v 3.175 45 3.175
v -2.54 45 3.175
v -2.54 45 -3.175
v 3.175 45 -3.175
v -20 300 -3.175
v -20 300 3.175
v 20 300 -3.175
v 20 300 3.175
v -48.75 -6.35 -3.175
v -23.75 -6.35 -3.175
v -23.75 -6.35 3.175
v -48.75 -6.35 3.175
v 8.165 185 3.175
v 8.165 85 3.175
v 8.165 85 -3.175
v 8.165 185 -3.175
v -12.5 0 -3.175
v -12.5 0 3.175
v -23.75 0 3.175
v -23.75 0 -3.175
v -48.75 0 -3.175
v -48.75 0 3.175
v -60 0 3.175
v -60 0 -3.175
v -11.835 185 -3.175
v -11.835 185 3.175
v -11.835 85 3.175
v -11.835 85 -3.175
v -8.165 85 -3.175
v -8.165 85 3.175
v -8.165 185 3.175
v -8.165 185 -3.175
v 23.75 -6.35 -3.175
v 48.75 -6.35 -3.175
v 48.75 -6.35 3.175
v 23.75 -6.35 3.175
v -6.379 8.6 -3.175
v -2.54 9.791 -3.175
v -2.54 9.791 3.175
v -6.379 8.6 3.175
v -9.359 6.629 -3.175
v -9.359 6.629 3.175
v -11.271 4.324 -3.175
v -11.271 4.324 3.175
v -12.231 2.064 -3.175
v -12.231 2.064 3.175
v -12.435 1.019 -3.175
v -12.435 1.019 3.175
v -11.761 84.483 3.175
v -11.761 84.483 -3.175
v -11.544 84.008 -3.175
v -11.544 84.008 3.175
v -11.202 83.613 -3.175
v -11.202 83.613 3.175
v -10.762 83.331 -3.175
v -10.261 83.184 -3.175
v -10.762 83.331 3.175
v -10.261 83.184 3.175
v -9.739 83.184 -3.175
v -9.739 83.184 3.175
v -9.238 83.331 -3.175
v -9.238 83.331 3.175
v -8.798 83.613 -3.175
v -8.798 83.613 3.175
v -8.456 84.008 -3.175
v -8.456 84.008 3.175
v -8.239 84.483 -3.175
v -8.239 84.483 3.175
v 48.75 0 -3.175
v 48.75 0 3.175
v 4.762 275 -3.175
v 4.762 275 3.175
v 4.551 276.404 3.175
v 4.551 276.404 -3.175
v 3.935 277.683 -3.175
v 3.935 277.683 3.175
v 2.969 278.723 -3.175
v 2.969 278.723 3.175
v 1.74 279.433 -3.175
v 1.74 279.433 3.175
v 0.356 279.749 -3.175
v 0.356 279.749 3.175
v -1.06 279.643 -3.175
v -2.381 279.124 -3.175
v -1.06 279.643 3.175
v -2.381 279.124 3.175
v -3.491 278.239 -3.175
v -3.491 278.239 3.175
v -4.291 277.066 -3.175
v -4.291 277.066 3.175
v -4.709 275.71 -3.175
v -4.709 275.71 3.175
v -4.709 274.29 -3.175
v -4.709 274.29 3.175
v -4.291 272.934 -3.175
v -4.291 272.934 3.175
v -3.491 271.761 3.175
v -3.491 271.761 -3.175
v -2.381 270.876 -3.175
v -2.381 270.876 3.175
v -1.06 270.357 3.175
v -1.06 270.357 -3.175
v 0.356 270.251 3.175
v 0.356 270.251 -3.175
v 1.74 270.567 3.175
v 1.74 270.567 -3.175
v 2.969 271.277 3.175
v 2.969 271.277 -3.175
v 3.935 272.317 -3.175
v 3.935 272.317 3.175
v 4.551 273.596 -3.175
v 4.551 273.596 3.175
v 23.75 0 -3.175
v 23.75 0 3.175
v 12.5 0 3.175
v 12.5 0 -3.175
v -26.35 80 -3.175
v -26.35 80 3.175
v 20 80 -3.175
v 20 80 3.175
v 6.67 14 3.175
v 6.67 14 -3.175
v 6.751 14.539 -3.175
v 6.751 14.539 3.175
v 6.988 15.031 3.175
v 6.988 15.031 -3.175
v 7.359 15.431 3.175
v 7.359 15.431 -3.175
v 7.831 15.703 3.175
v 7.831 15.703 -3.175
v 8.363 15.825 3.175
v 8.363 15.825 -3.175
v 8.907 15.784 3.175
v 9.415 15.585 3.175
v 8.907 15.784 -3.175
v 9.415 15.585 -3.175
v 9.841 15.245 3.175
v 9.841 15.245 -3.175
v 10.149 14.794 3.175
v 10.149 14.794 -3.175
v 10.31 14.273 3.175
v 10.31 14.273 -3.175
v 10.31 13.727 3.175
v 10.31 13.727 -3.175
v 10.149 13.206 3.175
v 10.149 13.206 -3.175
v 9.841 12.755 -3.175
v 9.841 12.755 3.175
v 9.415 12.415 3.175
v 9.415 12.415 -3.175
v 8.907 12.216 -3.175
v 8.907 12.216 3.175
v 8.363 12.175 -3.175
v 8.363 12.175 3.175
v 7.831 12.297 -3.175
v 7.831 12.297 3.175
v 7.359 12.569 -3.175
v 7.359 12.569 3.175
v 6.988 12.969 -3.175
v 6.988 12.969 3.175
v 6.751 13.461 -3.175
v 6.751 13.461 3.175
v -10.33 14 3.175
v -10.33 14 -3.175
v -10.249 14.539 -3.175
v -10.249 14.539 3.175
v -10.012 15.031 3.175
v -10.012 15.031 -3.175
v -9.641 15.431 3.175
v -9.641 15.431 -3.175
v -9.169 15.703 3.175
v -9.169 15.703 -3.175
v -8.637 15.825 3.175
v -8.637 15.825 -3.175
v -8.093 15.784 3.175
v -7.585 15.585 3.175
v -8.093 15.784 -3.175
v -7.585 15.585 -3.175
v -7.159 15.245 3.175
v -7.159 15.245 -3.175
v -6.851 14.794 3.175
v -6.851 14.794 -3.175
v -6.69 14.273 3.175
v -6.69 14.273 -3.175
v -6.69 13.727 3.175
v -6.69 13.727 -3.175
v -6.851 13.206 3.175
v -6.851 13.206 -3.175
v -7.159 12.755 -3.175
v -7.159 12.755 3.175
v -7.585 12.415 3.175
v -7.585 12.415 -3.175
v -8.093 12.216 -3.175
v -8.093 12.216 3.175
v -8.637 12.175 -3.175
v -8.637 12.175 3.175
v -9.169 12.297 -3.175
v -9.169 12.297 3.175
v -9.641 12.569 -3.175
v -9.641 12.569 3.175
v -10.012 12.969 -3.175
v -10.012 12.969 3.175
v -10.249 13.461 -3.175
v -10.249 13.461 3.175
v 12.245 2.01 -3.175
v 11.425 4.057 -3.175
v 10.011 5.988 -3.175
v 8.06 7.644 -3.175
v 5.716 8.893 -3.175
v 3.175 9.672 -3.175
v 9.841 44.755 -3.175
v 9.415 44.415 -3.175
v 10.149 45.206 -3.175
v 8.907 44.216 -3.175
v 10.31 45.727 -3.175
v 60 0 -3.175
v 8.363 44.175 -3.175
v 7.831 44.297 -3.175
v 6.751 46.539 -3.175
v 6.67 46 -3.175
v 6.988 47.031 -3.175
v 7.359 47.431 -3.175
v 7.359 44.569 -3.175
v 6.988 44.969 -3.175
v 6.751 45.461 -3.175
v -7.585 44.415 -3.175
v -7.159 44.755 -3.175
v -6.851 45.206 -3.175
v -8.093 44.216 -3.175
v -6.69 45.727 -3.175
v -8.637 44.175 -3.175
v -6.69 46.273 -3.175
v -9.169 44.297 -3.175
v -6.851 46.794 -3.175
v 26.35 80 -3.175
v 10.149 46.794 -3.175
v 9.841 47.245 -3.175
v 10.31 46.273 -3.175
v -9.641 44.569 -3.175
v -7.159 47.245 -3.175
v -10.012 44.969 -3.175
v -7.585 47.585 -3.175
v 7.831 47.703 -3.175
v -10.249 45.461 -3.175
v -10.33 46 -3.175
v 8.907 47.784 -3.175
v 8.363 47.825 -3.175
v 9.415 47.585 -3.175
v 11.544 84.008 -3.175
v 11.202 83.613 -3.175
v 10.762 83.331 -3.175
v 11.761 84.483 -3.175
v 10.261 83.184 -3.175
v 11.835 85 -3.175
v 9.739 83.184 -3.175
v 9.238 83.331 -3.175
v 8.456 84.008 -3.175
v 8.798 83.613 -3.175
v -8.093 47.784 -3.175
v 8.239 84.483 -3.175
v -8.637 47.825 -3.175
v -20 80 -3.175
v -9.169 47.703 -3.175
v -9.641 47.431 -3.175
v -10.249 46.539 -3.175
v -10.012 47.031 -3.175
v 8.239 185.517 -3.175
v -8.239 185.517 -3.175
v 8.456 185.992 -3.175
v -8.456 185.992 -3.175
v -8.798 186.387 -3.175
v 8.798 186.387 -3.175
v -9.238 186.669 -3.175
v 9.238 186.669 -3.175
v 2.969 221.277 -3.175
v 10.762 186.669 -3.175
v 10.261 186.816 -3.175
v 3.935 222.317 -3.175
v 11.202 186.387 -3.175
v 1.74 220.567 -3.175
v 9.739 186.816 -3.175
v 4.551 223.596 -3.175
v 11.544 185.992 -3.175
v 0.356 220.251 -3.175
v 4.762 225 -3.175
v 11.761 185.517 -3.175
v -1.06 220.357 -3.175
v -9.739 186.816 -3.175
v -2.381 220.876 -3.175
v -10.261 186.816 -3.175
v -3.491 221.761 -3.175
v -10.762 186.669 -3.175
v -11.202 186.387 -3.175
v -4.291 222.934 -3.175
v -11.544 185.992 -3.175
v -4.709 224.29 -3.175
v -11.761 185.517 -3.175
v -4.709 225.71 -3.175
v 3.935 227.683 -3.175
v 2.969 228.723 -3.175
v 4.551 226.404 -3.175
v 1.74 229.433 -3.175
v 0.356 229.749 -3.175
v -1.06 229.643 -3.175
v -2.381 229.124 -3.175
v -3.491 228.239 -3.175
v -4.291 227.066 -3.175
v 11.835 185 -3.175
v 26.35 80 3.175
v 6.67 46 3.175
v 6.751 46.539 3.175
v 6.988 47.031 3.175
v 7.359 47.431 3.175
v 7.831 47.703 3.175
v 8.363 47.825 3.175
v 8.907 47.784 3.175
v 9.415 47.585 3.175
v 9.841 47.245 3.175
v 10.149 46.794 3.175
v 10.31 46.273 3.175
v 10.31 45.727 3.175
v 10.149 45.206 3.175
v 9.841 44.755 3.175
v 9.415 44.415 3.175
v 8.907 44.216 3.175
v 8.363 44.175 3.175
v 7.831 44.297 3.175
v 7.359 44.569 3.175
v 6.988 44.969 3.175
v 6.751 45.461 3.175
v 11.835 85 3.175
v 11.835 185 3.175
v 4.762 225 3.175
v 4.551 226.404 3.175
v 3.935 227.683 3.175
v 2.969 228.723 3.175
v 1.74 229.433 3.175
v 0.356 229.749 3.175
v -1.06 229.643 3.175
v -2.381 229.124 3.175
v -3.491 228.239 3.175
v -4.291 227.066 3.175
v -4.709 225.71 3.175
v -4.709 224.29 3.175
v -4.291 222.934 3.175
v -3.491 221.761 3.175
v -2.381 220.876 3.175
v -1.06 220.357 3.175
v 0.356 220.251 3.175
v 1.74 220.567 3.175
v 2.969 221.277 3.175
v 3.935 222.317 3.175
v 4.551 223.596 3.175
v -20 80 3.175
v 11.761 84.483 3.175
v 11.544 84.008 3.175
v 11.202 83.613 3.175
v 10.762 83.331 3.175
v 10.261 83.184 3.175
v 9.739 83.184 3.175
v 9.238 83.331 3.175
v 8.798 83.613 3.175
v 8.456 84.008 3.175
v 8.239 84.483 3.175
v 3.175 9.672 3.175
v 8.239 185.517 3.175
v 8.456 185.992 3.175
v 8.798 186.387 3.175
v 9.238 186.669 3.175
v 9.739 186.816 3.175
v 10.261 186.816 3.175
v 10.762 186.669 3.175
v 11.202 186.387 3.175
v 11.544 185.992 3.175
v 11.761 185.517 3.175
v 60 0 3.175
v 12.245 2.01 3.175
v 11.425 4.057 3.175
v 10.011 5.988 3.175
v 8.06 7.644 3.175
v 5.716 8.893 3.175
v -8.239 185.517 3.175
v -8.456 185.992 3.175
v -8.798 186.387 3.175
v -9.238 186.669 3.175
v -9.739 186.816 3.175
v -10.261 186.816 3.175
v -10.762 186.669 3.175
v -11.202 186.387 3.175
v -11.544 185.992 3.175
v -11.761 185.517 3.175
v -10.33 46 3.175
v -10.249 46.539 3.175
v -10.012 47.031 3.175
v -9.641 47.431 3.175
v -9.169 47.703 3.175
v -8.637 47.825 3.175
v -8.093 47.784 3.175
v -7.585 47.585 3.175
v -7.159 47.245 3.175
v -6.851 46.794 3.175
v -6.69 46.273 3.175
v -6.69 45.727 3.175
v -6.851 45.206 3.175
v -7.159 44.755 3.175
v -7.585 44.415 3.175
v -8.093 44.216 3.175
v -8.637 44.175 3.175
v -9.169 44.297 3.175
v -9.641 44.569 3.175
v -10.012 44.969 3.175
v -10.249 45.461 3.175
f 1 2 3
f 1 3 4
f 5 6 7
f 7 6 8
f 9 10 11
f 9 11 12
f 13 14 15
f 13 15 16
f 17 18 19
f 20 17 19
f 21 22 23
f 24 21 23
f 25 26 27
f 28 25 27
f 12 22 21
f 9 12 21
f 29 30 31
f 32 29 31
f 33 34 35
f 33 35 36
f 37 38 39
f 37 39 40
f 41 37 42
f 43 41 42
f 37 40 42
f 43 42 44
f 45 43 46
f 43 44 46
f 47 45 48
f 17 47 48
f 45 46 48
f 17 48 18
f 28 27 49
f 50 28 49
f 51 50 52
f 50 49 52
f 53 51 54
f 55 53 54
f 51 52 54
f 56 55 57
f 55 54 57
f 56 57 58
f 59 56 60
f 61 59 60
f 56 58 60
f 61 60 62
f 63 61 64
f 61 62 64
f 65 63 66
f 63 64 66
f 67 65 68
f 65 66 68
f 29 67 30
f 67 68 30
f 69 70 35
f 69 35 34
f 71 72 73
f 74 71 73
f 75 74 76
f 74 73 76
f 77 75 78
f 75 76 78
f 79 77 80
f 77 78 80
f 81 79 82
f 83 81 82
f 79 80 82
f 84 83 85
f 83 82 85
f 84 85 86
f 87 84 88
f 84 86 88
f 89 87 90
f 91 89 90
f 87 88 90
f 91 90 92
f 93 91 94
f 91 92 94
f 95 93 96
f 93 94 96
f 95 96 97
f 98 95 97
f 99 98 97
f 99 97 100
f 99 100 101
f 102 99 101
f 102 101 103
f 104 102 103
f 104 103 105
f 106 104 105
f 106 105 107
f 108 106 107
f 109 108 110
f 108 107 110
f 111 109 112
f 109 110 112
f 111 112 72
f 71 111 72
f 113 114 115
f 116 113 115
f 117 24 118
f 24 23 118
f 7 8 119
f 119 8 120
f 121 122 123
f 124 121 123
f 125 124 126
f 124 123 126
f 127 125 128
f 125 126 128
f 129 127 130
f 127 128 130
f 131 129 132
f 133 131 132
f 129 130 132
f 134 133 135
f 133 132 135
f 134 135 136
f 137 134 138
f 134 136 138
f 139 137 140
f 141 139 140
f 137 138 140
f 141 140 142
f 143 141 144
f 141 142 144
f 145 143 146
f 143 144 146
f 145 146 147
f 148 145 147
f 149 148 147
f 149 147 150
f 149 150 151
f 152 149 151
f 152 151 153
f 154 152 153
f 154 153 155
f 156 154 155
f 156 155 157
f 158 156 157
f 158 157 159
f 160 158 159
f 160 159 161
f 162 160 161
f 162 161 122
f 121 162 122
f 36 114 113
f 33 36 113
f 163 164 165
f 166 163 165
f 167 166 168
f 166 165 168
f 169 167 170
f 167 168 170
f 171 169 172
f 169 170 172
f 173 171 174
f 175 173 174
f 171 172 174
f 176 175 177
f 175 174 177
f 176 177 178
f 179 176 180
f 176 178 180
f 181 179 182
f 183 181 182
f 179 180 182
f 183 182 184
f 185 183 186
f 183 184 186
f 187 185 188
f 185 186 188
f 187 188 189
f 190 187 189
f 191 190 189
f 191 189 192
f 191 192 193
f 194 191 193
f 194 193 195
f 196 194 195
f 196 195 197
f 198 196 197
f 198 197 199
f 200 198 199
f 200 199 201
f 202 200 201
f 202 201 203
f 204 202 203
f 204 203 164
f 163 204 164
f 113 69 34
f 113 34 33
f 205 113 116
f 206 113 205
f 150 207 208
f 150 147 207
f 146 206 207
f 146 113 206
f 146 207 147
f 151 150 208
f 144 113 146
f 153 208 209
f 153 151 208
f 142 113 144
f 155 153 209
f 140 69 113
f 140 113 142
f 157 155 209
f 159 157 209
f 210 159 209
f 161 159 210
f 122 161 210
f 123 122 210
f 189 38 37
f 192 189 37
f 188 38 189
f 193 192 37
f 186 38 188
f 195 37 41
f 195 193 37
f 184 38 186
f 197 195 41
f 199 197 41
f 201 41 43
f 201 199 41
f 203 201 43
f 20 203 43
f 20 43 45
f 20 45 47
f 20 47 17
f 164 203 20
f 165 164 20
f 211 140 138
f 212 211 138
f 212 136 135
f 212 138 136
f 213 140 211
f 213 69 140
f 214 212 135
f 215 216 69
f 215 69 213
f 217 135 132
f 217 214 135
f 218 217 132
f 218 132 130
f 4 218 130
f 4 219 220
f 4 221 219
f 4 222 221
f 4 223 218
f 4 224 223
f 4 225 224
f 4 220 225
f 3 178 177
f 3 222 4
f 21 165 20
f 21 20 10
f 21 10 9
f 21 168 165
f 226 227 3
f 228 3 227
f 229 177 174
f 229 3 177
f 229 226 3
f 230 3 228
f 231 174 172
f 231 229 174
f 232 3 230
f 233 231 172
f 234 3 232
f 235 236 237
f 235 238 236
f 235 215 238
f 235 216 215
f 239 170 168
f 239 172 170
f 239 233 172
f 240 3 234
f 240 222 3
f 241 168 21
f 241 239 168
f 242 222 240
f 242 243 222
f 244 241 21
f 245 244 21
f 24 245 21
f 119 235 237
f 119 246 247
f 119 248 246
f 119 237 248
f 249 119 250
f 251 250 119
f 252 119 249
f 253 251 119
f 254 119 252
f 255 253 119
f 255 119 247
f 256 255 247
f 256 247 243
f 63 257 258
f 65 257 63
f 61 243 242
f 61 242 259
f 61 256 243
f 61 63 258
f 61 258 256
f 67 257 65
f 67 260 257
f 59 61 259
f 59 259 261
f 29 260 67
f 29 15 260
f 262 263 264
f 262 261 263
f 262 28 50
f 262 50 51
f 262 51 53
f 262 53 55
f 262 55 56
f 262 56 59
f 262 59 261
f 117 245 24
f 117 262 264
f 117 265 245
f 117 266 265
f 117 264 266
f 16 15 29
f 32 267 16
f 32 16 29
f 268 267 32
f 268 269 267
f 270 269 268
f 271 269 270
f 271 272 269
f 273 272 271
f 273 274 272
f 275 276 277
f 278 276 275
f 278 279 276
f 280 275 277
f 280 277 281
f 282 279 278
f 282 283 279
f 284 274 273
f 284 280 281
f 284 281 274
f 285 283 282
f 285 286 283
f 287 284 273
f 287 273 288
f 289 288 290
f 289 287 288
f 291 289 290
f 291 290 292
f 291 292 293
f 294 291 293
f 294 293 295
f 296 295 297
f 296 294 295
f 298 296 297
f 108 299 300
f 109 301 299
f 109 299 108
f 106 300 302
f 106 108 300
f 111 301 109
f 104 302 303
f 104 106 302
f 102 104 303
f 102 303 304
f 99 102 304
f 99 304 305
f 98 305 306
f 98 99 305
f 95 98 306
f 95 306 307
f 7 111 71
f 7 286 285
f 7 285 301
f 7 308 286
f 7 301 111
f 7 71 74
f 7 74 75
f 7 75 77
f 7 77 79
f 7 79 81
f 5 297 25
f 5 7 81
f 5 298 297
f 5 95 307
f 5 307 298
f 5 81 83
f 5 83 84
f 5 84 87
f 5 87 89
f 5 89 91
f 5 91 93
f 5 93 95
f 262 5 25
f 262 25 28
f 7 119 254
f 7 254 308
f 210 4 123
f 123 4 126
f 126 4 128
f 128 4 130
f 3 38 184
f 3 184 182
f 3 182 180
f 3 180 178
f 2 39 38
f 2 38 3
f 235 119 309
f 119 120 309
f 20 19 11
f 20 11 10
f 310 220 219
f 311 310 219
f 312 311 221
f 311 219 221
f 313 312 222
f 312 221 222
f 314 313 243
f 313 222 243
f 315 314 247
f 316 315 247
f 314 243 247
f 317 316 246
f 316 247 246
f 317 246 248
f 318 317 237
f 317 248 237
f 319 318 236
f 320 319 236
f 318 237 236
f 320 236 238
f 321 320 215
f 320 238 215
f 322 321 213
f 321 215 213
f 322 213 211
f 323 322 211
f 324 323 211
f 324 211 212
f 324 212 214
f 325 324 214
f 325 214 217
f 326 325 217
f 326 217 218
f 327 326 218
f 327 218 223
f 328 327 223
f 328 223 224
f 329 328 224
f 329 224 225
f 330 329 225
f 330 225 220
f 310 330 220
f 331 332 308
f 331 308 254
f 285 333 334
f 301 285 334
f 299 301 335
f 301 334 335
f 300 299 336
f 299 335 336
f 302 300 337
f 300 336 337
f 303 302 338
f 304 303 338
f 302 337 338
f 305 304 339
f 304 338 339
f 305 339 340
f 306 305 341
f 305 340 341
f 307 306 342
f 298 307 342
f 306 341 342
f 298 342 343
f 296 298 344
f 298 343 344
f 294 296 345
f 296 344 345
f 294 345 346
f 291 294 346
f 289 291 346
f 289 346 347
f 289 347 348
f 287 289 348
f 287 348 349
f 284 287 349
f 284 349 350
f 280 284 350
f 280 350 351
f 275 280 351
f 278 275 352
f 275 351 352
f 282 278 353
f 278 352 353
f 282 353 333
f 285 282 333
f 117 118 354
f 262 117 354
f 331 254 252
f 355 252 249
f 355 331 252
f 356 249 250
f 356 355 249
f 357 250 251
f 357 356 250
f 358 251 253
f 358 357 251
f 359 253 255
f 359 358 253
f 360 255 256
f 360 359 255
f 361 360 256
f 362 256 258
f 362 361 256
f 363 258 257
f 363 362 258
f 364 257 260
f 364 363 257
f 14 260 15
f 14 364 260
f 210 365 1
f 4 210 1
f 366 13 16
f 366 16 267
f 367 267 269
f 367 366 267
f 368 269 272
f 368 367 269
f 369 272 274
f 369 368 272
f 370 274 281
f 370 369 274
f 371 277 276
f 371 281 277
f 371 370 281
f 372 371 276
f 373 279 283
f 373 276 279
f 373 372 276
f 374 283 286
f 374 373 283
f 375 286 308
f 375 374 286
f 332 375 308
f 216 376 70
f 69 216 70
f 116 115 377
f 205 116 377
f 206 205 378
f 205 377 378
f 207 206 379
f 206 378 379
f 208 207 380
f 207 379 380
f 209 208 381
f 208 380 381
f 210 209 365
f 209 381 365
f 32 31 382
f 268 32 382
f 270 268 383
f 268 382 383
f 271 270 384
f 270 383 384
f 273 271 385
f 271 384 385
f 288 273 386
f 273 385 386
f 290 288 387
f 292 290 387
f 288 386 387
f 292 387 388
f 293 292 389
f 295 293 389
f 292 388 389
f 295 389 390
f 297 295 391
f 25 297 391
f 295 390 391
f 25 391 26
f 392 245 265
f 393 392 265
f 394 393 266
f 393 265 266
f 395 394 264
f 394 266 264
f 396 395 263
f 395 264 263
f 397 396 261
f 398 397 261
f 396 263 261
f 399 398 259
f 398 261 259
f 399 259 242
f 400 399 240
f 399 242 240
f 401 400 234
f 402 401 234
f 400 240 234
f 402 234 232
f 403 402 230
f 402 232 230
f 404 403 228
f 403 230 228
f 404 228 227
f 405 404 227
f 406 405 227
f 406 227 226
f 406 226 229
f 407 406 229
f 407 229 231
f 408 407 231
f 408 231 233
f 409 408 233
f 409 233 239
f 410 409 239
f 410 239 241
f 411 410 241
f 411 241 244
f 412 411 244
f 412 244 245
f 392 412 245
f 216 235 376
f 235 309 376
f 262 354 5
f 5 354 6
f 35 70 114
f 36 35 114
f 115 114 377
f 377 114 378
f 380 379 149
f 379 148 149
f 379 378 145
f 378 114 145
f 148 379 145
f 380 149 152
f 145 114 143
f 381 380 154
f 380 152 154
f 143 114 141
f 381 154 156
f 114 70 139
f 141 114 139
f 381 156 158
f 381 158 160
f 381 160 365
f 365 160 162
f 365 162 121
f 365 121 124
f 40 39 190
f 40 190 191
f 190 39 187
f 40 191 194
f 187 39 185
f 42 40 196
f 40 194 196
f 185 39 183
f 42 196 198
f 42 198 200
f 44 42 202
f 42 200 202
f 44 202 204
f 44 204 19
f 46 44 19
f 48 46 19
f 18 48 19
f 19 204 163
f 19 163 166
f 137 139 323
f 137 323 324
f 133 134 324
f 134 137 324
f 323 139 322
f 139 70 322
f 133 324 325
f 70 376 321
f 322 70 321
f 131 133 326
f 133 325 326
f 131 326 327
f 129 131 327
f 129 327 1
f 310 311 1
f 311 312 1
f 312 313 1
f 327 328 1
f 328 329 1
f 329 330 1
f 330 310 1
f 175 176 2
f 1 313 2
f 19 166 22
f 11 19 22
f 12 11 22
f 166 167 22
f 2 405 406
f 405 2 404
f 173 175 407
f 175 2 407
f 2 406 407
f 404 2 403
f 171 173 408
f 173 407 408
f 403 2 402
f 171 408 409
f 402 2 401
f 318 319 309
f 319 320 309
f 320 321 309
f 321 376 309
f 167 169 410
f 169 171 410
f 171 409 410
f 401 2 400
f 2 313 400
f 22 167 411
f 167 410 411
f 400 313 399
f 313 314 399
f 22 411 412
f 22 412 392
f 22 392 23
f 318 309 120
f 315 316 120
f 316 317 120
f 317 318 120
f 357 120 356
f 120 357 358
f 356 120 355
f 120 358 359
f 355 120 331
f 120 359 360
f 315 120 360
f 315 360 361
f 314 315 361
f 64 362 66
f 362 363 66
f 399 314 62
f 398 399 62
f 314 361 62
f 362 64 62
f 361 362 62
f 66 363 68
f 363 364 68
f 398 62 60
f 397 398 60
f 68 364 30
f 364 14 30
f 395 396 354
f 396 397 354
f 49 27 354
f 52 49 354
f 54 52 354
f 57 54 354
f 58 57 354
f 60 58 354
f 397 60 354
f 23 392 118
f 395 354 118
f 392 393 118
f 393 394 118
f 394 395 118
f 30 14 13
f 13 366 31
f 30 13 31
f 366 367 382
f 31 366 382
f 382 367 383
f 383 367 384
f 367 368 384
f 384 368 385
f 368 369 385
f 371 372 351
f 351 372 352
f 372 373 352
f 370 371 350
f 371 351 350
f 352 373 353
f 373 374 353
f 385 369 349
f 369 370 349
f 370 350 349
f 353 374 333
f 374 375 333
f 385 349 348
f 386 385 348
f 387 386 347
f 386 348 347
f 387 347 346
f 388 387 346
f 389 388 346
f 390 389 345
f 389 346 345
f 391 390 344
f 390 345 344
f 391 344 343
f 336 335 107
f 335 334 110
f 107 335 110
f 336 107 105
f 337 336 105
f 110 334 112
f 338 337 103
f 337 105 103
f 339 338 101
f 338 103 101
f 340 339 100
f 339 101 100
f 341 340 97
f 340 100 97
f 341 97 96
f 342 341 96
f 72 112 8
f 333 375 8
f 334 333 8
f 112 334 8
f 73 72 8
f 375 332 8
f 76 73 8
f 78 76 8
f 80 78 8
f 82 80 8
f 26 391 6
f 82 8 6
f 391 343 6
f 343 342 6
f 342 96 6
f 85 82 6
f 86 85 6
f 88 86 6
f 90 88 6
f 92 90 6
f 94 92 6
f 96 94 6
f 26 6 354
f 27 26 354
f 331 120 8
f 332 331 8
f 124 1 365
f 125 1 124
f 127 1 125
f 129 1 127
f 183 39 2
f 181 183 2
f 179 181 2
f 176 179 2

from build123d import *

# Parameters (mm, degrees)
BOSS_EXTRU_1_DEPTH      = 3.175
SKETCH1_R               = 4.7625
CUT_EXTRUDE1_DEPTH      = 6.35
ENL_V_MAT_EXTRU_1_DEPTH = 6.35
ESQUISSE3_W             = 5.715
ESQUISSE3_H             = 45
ENL_V_MAT_EXTRU_2_DEPTH = 6.35
ENL_V_MAT_EXTRU_3_REACH = 308.007
ESQUISSE5_R             = 1.83
ENL_V_MAT_EXTRU_4_REACH = 308.007
SKETCH3_W               = 25
SKETCH3_H               = 6.35
BOSS_EXTRUDE2_DEPTH     = 6.35


with BuildPart() as part:
    # Esquisse1 → Boss.-Extru.1 (new, symmetric)
    with BuildSketch(Plane.XY):
        Polygon((-20, 300), (20, 300), (20, 80), (26.35, 80), (60, 0), (-60, 0), (-26.35, 80), (-20, 80), align=None)
    extrude(amount=BOSS_EXTRU_1_DEPTH, both=True)

    # Sketch1 → Cut-Extrude1 (cut)
    with BuildSketch(Plane.XY.offset(3.175)):
        with Locations((0, 275)):
            Circle(SKETCH1_R)
        with Locations((0, 225)):
            Circle(SKETCH1_R)
    extrude(amount=-CUT_EXTRUDE1_DEPTH, mode=Mode.SUBTRACT)

    # Esquisse2 → Enlèv. mat.-Extru.1 (cut)
    with BuildSketch(Plane.XY.offset(3.175)):
        with BuildLine():
            Line((-12.5, 0), (12.5, 0))
            add(Edge.make_bspline(
                [(12.5, 0), (12.5, 10), (0, 10), (-12.5, 10), (-12.5, 0)],
                knots=[0, 0, 0, 1.570796327, 1.570796327, 3.141592654, 3.141592654, 3.141592654], degree=2, weights=[1, 0.707106781, 1, 0.707106781, 1]))
        make_face()
    extrude(amount=-ENL_V_MAT_EXTRU_1_DEPTH, mode=Mode.SUBTRACT)

    # Esquisse3 → Enlèv. mat.-Extru.2 (cut)
    with BuildSketch(Plane.XY.offset(3.175)):
        with Locations((0.3175, 22.5)):
            Rectangle(ESQUISSE3_W, ESQUISSE3_H)
    extrude(amount=-ENL_V_MAT_EXTRU_2_DEPTH, mode=Mode.SUBTRACT)

    # Esquisse5 → Enlèv. mat.-Extru.3 (cut, up to next)
    with BuildSketch(Plane(origin=(0, 0, -3.175), x_dir=(-1, 0, 0), z_dir=(0, 0, -1)), mode=Mode.PRIVATE) as enl_v_mat_extru_3_sk1:
        with Locations((-8.5, 46)):
            Circle(ESQUISSE5_R)
    enl_v_mat_extru_3_tool1 = extrude(enl_v_mat_extru_3_sk1.sketch, amount=-ENL_V_MAT_EXTRU_3_REACH, mode=Mode.PRIVATE) & part.part
    # Esquisse5 → Enlèv. mat.-Extru.3 (cut, up to next)
    with BuildSketch(Plane(origin=(0, 0, -3.175), x_dir=(-1, 0, 0), z_dir=(0, 0, -1)), mode=Mode.PRIVATE) as enl_v_mat_extru_3_sk2:
        with Locations((8.5, 46)):
            Circle(ESQUISSE5_R)
    enl_v_mat_extru_3_tool2 = extrude(enl_v_mat_extru_3_sk2.sketch, amount=-ENL_V_MAT_EXTRU_3_REACH, mode=Mode.PRIVATE) & part.part
    # Esquisse5 → Enlèv. mat.-Extru.3 (cut, up to next)
    with BuildSketch(Plane(origin=(0, 0, -3.175), x_dir=(-1, 0, 0), z_dir=(0, 0, -1)), mode=Mode.PRIVATE) as enl_v_mat_extru_3_sk3:
        with Locations((8.5, 14)):
            Circle(ESQUISSE5_R)
    enl_v_mat_extru_3_tool3 = extrude(enl_v_mat_extru_3_sk3.sketch, amount=-ENL_V_MAT_EXTRU_3_REACH, mode=Mode.PRIVATE) & part.part
    # Esquisse5 → Enlèv. mat.-Extru.3 (cut, up to next)
    with BuildSketch(Plane(origin=(0, 0, -3.175), x_dir=(-1, 0, 0), z_dir=(0, 0, -1)), mode=Mode.PRIVATE) as enl_v_mat_extru_3_sk4:
        with Locations((-8.5, 14)):
            Circle(ESQUISSE5_R)
    enl_v_mat_extru_3_tool4 = extrude(enl_v_mat_extru_3_sk4.sketch, amount=-ENL_V_MAT_EXTRU_3_REACH, mode=Mode.PRIVATE) & part.part
    add(enl_v_mat_extru_3_tool1.solids().sort_by_distance((8.5, 46, -3.175))[0], mode=Mode.SUBTRACT)
    add(enl_v_mat_extru_3_tool2.solids().sort_by_distance((-8.5, 46, -3.175))[0], mode=Mode.SUBTRACT)
    add(enl_v_mat_extru_3_tool3.solids().sort_by_distance((-8.5, 14, -3.175))[0], mode=Mode.SUBTRACT)
    add(enl_v_mat_extru_3_tool4.solids().sort_by_distance((8.5, 14, -3.175))[0], mode=Mode.SUBTRACT)

    # Esquisse6 → Enlèv. mat.-Extru.4 (cut, up to next)
    with BuildSketch(Plane.XY.offset(3.175), mode=Mode.PRIVATE) as enl_v_mat_extru_4_sk1:
        with BuildLine():
            Line((-11.835, 185), (-11.835, 85))
            ThreePointArc((-11.835, 85), (-10, 83.165), (-8.165, 85))
            Line((-8.165, 85), (-8.165, 185))
            ThreePointArc((-8.165, 185), (-10, 186.835), (-11.835, 185))
        make_face()
    enl_v_mat_extru_4_tool1 = extrude(enl_v_mat_extru_4_sk1.sketch, amount=-ENL_V_MAT_EXTRU_4_REACH, mode=Mode.PRIVATE) & part.part
    # Esquisse6 → Enlèv. mat.-Extru.4 (cut, up to next)
    with BuildSketch(Plane.XY.offset(3.175), mode=Mode.PRIVATE) as enl_v_mat_extru_4_sk2:
        with BuildLine():
            Line((11.835, 185), (11.835, 85))
            ThreePointArc((11.835, 85), (10, 83.165), (8.165, 85))
            Line((8.165, 85), (8.165, 185))
            ThreePointArc((8.165, 185), (10, 186.835), (11.835, 185))
        make_face()
    enl_v_mat_extru_4_tool2 = extrude(enl_v_mat_extru_4_sk2.sketch, amount=-ENL_V_MAT_EXTRU_4_REACH, mode=Mode.PRIVATE) & part.part
    add(enl_v_mat_extru_4_tool1.solids().sort_by_distance((-10, 135, 3.175))[0], mode=Mode.SUBTRACT)
    add(enl_v_mat_extru_4_tool2.solids().sort_by_distance((10, 135, 3.175))[0], mode=Mode.SUBTRACT)

    # Sketch3 → Boss-Extrude2 (add)
    with BuildSketch(Plane(origin=(0, 0, 0), x_dir=(-1, 0, 0), z_dir=(0, -1, 0))):
        with Locations((-36.25, 0)):
            Rectangle(SKETCH3_W, SKETCH3_H)
        with Locations((36.25, 0)):
            Rectangle(SKETCH3_W, SKETCH3_H)
    extrude(amount=BOSS_EXTRUDE2_DEPTH)


solid = part.part
